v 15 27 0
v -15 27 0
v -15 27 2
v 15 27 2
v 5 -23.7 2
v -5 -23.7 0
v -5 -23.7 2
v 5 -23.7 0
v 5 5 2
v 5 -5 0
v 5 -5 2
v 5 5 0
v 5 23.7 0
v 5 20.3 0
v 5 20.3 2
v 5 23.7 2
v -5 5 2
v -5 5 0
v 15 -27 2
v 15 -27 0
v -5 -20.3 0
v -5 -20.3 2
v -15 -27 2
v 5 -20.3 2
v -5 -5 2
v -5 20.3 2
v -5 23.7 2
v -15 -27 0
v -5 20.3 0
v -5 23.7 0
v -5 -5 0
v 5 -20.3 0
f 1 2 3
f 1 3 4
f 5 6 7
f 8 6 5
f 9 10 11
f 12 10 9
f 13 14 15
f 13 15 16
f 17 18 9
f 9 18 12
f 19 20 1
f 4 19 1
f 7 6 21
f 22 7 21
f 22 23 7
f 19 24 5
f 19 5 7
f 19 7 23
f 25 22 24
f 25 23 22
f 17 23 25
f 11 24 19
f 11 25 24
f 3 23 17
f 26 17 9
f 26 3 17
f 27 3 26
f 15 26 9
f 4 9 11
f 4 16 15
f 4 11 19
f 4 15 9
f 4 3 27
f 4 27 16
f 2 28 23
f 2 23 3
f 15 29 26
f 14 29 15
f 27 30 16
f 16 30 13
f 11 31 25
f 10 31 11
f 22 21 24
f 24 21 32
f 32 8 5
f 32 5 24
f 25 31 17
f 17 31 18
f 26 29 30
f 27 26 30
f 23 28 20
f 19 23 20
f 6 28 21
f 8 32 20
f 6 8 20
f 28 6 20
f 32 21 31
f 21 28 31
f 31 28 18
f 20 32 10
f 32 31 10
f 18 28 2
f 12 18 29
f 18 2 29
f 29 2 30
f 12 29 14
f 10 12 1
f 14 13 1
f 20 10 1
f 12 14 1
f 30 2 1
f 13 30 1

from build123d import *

# Parameters (mm, degrees)
SKETCH1_W                        = 30
SKETCH1_H                        = 54
PLATE_54X30_DEPTH                = 2
OPTICAL_WINDOW_10X10_START       = -0.1
SKETCH2_W                        = 10
SKETCH2_H                        = 10
OPTICAL_WINDOW_10X10_DEPTH       = 2.2
VERTICAL_M3_ADJUSTMENT_1_START   = -0.1
SKETCH3_W                        = 10
SKETCH3_H                        = 3.4
VERTICAL_M3_ADJUSTMENT_1_DEPTH   = 2.2
SKETCH4_W                        = 10
SKETCH4_H                        = 3.4
VERTICAL_M3_ADJUSTMENT_1_2_DEPTH = 2.2


with BuildPart() as part:
    # Sketch1 → Plate_54x30 (new body)
    with BuildSketch(Plane.XY):
        Rectangle(SKETCH1_W, SKETCH1_H)
    extrude(amount=PLATE_54X30_DEPTH)

    # Sketch2 → Optical_Window_10x10 (cut)
    with BuildSketch(Plane.XY.offset(OPTICAL_WINDOW_10X10_START)):
        Rectangle(SKETCH2_W, SKETCH2_H)
    extrude(amount=OPTICAL_WINDOW_10X10_DEPTH, mode=Mode.SUBTRACT)

    # Sketch3 → Vertical_M3_Adjustment_-1 (cut)
    with BuildSketch(Plane.XY.offset(VERTICAL_M3_ADJUSTMENT_1_START)):
        with Locations((0, -22)):
            Rectangle(SKETCH3_W, SKETCH3_H)
    extrude(amount=VERTICAL_M3_ADJUSTMENT_1_DEPTH, mode=Mode.SUBTRACT)

    # Sketch4 → Vertical_M3_Adjustment_1 2 (cut)
    with BuildSketch(Plane.XY.offset(VERTICAL_M3_ADJUSTMENT_1_START)):
        with Locations((0, 22)):
            Rectangle(SKETCH4_W, SKETCH4_H)
    extrude(amount=VERTICAL_M3_ADJUSTMENT_1_2_DEPTH, mode=Mode.SUBTRACT)


solid = part.part
